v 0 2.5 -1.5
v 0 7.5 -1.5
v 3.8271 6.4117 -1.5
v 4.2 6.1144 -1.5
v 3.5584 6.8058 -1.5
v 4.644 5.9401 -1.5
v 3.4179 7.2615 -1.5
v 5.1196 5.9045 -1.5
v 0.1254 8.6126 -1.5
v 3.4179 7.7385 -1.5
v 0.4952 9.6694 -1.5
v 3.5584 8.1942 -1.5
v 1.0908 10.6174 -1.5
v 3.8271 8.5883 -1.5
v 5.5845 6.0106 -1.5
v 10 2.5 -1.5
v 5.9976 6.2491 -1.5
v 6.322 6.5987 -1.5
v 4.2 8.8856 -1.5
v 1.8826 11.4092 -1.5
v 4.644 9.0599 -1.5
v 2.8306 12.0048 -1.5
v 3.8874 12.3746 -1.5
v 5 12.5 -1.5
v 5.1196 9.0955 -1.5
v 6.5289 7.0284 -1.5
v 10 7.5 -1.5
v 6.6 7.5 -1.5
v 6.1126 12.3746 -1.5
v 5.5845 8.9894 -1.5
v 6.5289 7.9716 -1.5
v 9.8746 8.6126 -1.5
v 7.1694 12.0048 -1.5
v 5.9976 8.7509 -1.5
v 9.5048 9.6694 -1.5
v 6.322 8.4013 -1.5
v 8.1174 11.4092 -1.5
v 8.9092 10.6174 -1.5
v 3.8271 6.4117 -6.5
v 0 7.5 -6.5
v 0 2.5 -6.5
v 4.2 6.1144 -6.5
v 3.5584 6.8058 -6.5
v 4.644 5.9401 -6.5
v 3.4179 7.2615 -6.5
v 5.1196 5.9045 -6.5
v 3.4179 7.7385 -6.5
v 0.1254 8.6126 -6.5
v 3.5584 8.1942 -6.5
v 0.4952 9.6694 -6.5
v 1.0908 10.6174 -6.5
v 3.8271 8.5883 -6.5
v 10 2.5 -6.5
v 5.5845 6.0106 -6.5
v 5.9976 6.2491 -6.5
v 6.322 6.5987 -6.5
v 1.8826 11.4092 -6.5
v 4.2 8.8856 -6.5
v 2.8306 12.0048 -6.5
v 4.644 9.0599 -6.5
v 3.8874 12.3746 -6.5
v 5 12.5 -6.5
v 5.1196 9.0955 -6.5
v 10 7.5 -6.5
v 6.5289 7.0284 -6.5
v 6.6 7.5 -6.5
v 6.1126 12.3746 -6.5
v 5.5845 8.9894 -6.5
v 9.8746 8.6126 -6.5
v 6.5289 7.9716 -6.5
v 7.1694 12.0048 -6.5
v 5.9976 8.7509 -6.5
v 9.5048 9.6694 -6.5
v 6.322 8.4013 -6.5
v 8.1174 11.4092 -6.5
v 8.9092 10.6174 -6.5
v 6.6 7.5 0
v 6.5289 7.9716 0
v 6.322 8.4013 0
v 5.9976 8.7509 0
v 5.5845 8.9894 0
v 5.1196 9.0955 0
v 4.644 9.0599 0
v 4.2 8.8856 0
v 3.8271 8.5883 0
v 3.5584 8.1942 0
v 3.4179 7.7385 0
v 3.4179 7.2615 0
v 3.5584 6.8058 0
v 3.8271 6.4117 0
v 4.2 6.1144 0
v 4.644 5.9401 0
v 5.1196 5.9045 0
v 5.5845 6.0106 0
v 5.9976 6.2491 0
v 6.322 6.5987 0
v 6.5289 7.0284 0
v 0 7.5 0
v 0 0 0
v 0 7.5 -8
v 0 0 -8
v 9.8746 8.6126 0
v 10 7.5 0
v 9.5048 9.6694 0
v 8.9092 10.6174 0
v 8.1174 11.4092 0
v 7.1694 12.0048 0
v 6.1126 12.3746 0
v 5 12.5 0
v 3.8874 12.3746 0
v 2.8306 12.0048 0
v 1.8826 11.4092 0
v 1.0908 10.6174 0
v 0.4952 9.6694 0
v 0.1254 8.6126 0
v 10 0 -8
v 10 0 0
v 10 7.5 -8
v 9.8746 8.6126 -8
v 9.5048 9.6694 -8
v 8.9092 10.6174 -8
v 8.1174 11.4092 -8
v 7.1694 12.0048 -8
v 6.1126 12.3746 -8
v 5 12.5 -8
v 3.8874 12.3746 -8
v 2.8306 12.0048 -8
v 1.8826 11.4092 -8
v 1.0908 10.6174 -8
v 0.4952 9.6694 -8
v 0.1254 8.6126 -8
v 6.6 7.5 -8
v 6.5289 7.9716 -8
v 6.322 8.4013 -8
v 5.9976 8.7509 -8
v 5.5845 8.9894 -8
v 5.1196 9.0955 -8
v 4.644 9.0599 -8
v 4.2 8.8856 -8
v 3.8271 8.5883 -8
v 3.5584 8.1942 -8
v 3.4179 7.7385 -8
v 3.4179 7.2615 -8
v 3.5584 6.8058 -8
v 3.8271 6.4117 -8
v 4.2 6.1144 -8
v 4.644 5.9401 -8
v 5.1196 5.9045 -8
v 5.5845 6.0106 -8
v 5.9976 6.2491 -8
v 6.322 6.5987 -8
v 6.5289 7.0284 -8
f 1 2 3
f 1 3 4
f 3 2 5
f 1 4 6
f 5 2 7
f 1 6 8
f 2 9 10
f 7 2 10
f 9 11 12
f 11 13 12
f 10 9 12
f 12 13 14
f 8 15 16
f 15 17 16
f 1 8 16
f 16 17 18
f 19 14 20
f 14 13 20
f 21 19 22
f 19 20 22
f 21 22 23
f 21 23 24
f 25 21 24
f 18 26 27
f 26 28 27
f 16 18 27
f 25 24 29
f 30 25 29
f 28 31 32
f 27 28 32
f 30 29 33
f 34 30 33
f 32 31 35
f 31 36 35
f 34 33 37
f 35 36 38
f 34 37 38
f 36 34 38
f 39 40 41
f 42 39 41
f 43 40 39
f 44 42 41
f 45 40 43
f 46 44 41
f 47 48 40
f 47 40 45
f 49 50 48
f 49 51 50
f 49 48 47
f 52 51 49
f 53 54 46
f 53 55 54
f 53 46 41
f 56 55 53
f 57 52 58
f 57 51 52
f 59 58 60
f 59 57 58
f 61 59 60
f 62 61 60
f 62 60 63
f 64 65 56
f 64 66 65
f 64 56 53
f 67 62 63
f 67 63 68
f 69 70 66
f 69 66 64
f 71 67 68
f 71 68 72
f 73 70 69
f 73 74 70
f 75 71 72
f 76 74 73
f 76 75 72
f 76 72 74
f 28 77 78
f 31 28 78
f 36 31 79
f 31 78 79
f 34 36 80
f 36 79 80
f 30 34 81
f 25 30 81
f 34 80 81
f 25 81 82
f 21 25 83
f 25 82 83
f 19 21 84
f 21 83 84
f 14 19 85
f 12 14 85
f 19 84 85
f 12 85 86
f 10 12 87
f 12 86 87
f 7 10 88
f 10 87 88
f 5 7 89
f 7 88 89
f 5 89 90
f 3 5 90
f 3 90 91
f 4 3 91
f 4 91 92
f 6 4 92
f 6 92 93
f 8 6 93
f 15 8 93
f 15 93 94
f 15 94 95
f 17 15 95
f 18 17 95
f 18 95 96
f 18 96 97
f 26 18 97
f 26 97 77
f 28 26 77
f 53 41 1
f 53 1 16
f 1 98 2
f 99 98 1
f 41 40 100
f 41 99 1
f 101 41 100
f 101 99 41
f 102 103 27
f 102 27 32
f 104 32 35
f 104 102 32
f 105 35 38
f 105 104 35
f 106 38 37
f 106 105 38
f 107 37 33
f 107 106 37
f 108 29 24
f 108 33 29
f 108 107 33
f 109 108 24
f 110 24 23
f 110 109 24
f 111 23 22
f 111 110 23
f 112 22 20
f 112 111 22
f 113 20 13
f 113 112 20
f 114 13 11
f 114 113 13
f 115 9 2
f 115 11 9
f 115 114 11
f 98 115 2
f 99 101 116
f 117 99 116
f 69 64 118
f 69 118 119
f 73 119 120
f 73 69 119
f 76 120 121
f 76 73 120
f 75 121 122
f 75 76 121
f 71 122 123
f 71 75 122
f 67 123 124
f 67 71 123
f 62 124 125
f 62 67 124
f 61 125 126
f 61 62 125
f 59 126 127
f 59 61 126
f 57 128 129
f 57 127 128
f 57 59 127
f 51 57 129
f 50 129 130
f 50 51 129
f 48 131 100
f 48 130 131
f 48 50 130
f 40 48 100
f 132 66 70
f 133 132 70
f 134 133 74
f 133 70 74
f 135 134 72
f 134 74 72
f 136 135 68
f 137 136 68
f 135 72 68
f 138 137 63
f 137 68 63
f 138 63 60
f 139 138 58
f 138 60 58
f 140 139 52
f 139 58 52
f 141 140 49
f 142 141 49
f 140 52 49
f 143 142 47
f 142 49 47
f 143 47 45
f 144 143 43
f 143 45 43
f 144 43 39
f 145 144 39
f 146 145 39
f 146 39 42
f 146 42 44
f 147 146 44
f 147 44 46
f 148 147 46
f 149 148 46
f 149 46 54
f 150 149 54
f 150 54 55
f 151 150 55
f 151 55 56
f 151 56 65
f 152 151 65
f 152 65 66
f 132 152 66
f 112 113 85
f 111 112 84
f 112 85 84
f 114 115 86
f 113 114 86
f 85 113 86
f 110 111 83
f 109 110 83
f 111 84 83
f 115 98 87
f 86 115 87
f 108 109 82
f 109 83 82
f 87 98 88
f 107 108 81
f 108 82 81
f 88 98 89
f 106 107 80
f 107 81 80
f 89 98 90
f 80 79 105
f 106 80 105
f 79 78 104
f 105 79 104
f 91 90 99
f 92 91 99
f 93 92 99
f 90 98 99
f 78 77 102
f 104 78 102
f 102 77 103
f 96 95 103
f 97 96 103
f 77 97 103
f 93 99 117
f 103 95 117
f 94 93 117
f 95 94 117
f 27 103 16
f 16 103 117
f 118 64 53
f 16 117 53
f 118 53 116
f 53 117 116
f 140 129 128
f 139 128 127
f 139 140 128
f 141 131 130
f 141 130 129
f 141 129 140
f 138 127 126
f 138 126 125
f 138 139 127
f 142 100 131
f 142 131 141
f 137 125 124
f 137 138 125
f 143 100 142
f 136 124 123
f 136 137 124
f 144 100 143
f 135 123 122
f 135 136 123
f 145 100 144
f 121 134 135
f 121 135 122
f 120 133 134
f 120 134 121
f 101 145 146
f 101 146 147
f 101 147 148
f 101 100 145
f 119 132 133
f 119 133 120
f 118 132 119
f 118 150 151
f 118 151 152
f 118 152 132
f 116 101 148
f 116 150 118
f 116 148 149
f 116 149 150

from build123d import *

# Parameters (mm, degrees)
SKETCH_2_W          = 10
SKETCH_2_H          = 8
EXTRUDE_1_DEPTH     = 12.5
SKETCH_3_W          = 10
SKETCH_3_H          = 5
CUT_EXTRUDE_1_DEPTH = 10
SKETCH_4_R          = 1.6
CUT_EXTRUDE_2_DEPTH = 18.895530168
SKETCH_5_OUTSIDE_W  = 15.58
SKETCH_5_OUTSIDE_H  = 18.08
CUT_EXTRUDE_3_DEPTH = 18.895530168


with BuildPart() as part:
    # ｽｹｯﾁ2 → ﾎﾞｽ - 押し出し1 (new body)
    with BuildSketch(Plane(origin=(0, 0, 0), x_dir=(1, 0, 0), z_dir=(0, 1, 0))):
        with Locations((5, 4)):
            Rectangle(SKETCH_2_W, SKETCH_2_H)
    extrude(amount=EXTRUDE_1_DEPTH)

    # ｽｹｯﾁ3 → ｶｯﾄ - 押し出し1 (cut)
    with BuildSketch(Plane(origin=(0, 12.5, 0), x_dir=(1, 0, 0), z_dir=(0, 1, 0))):
        with Locations((5, 4)):
            Rectangle(SKETCH_3_W, SKETCH_3_H)
    extrude(amount=-CUT_EXTRUDE_1_DEPTH, mode=Mode.SUBTRACT)

    # ｽｹｯﾁ4 → ｶｯﾄ - 押し出し2 (cut, through all)
    with BuildSketch(Plane.XY):
        with Locations((5, 7.5)):
            Circle(SKETCH_4_R)
    extrude(amount=-CUT_EXTRUDE_2_DEPTH, mode=Mode.SUBTRACT)

    # ｽｹｯﾁ5 outside → ｶｯﾄ - 押し出し3 (cut, through all)
    with BuildSketch(Plane.XY):
        with Locations((5, 6.25)):
            Rectangle(SKETCH_5_OUTSIDE_W, SKETCH_5_OUTSIDE_H)
        with BuildLine():
            Line((0, 7.5), (0, 0))
            Line((0, 0), (10, 0))
            Line((10, 0), (10, 7.5))
            ThreePointArc((10, 7.5), (5, 12.5), (0, 7.5))
        make_face(mode=Mode.SUBTRACT)
    extrude(amount=-CUT_EXTRUDE_3_DEPTH, mode=Mode.SUBTRACT)


solid = part.part
